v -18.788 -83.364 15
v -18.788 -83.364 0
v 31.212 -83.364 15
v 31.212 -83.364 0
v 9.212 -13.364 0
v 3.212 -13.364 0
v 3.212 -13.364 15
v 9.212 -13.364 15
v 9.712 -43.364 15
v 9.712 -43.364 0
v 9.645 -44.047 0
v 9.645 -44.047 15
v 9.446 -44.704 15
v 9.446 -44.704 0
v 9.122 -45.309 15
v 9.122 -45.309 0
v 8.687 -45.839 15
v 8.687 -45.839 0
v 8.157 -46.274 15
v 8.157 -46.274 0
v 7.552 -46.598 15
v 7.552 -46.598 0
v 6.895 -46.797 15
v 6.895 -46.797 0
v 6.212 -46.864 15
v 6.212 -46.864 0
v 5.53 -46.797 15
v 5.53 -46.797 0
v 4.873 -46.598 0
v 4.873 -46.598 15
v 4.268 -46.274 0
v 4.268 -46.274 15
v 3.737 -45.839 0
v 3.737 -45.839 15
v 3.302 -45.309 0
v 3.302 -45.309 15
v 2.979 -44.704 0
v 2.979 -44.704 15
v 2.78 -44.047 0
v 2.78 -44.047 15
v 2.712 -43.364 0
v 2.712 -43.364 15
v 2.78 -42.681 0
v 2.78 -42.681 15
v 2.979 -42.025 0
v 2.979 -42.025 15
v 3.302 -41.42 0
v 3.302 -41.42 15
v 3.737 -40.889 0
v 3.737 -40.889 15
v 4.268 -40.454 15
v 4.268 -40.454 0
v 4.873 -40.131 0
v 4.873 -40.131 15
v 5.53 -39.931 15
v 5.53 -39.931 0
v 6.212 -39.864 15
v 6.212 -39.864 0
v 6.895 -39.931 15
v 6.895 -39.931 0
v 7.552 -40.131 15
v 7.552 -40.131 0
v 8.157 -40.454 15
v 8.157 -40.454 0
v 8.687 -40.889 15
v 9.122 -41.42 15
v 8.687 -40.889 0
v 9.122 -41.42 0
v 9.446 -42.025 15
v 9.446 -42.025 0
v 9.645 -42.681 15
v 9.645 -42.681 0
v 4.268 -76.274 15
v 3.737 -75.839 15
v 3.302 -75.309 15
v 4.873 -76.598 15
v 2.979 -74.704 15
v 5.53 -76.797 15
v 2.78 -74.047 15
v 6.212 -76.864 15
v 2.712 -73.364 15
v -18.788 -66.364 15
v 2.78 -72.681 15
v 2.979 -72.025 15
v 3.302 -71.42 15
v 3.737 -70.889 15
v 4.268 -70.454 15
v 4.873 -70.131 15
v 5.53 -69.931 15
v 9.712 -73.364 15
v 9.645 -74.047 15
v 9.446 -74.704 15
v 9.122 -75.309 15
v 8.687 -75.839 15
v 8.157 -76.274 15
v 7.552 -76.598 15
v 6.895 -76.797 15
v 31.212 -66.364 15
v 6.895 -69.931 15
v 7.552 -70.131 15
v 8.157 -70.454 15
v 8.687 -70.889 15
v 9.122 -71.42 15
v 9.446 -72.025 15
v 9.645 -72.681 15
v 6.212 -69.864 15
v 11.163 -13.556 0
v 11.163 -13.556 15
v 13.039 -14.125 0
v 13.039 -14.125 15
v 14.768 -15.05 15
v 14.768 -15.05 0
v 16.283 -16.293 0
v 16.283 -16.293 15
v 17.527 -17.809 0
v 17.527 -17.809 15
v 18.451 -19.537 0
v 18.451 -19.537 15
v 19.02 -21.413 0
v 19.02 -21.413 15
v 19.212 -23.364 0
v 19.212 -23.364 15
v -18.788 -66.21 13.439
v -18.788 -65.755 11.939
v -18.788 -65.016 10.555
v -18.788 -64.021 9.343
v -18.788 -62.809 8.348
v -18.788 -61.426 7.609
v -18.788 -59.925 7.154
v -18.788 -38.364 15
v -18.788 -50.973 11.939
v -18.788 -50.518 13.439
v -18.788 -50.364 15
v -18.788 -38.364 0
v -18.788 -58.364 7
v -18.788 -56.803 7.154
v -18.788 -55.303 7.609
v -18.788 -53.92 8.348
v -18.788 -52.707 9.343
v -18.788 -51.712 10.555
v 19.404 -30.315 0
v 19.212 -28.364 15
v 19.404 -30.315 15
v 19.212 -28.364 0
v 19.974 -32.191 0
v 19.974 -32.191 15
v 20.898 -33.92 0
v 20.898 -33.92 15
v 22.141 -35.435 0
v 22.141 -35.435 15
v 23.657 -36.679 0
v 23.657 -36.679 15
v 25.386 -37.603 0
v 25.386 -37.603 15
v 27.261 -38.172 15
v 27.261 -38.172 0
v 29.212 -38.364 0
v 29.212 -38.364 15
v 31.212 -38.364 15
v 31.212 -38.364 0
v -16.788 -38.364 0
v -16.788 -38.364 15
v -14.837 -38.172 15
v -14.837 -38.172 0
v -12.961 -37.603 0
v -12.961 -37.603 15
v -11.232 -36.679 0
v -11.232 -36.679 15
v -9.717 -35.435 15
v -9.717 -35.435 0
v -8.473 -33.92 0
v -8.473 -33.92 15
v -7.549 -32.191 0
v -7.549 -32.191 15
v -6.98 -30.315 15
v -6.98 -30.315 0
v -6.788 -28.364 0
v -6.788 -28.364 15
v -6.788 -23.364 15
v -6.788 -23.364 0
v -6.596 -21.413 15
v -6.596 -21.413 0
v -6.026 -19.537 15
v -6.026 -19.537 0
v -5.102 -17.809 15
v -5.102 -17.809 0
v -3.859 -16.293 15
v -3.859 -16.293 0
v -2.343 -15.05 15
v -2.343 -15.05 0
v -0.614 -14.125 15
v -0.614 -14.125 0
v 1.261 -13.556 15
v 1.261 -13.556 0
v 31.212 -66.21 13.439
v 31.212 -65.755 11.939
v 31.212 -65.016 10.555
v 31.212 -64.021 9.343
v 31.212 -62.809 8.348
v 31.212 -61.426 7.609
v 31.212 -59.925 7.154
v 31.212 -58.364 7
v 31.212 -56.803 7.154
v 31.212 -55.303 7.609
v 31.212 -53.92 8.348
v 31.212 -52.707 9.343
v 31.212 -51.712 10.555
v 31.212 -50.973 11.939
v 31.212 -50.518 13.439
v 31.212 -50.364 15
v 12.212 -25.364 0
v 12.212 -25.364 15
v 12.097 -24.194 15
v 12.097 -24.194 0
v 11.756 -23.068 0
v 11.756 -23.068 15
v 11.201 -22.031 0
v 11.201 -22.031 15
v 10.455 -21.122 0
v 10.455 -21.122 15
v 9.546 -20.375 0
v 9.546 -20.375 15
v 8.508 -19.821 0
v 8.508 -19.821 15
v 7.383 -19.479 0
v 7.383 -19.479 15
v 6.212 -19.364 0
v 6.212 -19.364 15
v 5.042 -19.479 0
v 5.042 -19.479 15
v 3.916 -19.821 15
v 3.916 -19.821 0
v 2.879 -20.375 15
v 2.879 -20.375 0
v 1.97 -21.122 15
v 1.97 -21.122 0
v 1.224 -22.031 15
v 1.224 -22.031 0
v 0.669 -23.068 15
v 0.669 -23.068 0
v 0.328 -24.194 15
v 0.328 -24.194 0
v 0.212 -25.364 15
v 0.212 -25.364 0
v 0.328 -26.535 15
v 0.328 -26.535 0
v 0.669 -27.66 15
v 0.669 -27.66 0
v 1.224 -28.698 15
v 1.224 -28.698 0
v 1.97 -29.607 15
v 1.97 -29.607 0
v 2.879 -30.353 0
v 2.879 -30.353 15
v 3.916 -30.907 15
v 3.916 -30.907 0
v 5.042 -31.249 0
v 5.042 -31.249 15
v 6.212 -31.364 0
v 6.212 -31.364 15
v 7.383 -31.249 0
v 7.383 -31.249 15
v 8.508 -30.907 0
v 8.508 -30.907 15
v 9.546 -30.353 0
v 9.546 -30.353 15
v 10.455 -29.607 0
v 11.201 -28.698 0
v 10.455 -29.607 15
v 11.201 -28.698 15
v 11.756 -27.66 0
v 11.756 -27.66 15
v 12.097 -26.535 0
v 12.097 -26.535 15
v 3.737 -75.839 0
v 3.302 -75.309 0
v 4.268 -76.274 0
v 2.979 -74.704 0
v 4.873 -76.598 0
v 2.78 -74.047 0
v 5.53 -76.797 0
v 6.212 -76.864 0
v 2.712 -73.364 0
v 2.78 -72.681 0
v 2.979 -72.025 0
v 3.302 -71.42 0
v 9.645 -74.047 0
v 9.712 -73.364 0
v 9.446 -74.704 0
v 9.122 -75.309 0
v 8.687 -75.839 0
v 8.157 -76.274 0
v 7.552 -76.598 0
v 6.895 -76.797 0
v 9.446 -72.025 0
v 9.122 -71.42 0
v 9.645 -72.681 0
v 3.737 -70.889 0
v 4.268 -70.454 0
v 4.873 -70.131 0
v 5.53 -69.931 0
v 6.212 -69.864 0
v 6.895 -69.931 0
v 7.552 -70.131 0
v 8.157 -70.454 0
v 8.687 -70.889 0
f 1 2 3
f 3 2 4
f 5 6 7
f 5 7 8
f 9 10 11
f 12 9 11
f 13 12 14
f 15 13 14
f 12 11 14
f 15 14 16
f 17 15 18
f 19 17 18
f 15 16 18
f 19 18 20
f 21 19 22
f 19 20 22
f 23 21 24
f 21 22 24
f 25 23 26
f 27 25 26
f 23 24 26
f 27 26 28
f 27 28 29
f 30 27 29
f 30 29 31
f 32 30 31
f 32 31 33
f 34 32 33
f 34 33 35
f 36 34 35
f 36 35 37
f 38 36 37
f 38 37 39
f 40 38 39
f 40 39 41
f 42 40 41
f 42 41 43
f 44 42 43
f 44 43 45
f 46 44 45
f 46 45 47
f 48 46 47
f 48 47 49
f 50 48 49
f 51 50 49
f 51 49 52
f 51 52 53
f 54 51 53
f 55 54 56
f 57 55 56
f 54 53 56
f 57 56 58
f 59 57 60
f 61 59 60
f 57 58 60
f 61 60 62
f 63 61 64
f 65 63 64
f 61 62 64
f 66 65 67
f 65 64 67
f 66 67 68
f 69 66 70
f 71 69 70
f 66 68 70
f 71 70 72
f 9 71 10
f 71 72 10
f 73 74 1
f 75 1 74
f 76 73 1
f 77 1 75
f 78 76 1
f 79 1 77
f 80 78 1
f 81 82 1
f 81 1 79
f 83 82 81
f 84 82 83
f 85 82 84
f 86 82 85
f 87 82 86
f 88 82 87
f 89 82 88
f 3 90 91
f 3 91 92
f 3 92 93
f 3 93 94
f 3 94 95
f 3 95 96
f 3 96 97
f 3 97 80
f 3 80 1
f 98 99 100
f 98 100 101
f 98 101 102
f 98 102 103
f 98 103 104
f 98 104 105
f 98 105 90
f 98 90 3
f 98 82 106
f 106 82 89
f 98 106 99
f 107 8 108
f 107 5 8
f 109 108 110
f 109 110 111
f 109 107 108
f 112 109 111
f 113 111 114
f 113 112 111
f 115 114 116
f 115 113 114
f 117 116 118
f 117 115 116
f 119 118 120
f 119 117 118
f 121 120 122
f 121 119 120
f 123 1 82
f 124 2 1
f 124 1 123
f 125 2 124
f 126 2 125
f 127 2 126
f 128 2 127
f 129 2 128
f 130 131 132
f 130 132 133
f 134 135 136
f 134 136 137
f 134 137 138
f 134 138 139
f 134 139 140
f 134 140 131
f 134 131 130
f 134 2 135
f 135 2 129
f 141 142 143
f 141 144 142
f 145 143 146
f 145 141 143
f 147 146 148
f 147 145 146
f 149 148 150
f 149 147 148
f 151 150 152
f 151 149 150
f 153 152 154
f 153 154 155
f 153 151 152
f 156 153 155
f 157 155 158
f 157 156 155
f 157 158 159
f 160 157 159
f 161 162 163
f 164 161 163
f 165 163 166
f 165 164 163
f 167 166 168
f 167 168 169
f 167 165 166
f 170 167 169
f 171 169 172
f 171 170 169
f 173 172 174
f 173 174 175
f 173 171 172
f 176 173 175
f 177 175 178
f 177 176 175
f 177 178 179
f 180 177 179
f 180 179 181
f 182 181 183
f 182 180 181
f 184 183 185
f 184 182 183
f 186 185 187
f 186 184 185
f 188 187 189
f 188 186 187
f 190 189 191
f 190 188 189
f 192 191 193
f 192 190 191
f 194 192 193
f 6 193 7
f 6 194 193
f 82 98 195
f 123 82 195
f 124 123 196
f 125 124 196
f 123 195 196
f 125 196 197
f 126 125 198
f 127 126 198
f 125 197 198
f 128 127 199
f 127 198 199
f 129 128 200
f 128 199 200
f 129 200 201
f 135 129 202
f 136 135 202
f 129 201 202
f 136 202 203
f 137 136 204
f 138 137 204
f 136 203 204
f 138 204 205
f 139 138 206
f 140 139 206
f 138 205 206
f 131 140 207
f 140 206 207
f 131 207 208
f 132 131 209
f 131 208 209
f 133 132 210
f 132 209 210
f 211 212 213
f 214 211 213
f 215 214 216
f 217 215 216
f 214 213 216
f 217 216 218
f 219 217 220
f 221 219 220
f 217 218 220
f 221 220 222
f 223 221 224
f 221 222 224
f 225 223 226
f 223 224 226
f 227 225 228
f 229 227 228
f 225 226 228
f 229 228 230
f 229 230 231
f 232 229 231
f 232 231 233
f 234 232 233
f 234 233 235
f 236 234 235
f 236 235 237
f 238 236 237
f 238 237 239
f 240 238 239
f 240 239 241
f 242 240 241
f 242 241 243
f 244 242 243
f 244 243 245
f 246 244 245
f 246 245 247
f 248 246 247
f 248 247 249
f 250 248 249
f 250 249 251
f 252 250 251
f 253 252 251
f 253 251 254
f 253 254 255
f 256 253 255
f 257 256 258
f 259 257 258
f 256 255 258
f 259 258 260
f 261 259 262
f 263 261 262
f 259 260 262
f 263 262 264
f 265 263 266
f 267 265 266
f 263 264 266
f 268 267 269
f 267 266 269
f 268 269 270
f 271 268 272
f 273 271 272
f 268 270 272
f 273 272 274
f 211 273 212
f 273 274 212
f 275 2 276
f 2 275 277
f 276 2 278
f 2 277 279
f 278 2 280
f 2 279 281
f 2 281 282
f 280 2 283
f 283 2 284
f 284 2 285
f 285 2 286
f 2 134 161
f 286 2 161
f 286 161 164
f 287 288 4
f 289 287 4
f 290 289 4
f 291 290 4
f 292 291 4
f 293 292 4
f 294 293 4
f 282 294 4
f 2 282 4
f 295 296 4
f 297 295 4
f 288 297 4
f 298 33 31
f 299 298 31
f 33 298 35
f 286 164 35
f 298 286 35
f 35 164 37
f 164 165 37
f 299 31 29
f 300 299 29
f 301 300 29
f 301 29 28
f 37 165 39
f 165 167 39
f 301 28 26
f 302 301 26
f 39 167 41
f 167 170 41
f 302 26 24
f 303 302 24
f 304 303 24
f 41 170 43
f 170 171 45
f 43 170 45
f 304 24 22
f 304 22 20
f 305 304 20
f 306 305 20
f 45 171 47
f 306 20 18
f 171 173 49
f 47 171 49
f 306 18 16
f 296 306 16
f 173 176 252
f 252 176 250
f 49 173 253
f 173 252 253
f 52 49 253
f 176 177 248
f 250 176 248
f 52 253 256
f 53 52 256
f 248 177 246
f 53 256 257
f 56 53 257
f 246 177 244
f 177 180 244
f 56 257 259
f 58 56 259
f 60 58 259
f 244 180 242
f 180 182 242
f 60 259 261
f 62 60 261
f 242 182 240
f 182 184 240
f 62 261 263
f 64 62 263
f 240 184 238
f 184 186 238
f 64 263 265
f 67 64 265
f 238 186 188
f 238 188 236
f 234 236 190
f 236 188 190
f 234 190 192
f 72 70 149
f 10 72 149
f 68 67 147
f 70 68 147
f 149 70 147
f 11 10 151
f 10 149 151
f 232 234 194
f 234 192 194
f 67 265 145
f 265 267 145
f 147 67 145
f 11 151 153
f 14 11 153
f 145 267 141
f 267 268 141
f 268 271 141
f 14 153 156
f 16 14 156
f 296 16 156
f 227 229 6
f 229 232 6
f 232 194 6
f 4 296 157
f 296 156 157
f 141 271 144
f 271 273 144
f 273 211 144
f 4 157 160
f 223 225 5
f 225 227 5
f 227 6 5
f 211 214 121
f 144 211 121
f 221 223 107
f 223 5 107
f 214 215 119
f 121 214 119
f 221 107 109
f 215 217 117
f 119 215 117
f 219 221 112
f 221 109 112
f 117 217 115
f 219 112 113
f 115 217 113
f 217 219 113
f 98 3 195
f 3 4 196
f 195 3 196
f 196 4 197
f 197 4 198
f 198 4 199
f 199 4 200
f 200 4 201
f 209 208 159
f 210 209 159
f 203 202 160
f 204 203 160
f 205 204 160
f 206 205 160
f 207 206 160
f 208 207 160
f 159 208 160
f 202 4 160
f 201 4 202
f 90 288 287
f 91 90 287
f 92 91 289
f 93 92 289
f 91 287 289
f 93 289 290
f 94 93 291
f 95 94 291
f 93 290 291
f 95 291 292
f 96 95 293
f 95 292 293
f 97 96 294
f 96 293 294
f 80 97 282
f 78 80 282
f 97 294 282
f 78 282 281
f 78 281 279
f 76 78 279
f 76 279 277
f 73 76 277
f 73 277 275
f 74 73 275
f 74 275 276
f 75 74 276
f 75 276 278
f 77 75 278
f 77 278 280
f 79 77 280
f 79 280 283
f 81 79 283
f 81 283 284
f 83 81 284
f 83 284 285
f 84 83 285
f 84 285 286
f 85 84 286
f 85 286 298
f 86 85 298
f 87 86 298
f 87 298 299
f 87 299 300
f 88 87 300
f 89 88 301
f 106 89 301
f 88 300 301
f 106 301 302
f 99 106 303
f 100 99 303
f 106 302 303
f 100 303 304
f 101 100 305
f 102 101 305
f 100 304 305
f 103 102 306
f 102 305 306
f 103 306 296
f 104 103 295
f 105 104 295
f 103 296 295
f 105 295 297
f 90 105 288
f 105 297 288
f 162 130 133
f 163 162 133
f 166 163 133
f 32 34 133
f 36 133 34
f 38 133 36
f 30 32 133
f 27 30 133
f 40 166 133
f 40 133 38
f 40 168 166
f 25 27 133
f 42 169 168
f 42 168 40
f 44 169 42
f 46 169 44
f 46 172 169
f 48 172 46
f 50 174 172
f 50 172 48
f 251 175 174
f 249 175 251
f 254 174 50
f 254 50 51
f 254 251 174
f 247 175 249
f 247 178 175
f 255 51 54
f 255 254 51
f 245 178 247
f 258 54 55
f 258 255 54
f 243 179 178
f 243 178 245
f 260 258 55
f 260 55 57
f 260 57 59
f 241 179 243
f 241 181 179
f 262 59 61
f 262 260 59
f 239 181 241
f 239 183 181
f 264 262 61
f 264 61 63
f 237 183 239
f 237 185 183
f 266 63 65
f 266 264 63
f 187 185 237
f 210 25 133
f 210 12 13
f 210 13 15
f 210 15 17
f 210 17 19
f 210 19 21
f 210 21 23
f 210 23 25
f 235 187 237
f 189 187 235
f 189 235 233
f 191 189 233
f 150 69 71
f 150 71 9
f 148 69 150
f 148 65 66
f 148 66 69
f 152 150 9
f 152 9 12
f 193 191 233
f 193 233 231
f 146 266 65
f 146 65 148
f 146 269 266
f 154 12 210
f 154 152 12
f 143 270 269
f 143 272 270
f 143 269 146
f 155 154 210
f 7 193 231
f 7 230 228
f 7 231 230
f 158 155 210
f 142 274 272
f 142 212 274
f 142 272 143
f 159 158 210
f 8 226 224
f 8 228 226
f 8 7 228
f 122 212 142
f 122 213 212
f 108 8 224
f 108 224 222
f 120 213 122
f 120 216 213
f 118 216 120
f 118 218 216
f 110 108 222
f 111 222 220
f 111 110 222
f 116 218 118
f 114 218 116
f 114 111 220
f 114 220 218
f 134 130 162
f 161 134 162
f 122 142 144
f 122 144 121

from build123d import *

# Parameters (mm, degrees)
F0_W     = 50
F0_H     = 70
F1_DEPTH = 15
F2_R     = 6
F3_DEPTH = 25
F4_R     = 8
F5_DEPTH = 50.001
F6_R     = 3.5
F7_DEPTH = 15.001
F8_W     = 12
F8_H     = 25
F9_DEPTH = 15
F10_R    = 10


# Not quite as in the source:
# - a feature names something its author has since deleted; it is built from what else it names


with BuildPart() as f1:
    # F0 (on Top) → F1 (new body)
    with BuildSketch(Plane.XY):
        with Locations((6.2123397365, -48.3642113331)):
            Rectangle(F0_W, F0_H)
    extrude(amount=F1_DEPTH)

    # F2 (on face) → F3 (cut)
    with BuildSketch(Plane.XY.offset(15)):
        with Locations((6.2123397365, -25.3642113331)):
            Circle(F2_R)
    extrude(amount=-F3_DEPTH, mode=Mode.SUBTRACT)

    # F4 (on face) → F5 (cut, through all)
    with BuildSketch(Plane.YZ.offset(31.2123397365)):
        with Locations((-58.3642113331, 15)):
            Circle(F4_R)
    extrude(amount=-F5_DEPTH, mode=Mode.SUBTRACT)

    # F6 (on face) → F7 (cut, through all)
    with BuildSketch(Plane(origin=(0, 0, 0), x_dir=(1, 0, 0), z_dir=(0, 0, -1))):
        with Locations((6.2123397365, 43.3642113331)):
            Circle(F6_R)
        with Locations((6.2123397365, 73.3642113331)):
            Circle(F6_R)
    extrude(amount=-F7_DEPTH, mode=Mode.SUBTRACT)

    # F8 (on face) → F9 (cut, through all)
    with BuildSketch(Plane.XY.offset(15)):
        with Locations((25.2123397365, -25.8642113331)):
            Rectangle(F8_W, F8_H)
        with Locations((-12.7876602635, -25.8642113331)):
            Rectangle(F8_W, F8_H)
    extrude(amount=-F9_DEPTH, mode=Mode.SUBTRACT)

    # F10
    f10_edges = [f1.edges().sort_by_distance(p)[0] for p in [
        (19.21234, -13.364211, 7.5),
        (-6.78766, -13.364211, 7.5),
        (-6.78766, -38.364211, 7.5),
        (19.21234, -38.364211, 7.5),
    ]]
    fillet(f10_edges, radius=F10_R)


solid = f1.part
